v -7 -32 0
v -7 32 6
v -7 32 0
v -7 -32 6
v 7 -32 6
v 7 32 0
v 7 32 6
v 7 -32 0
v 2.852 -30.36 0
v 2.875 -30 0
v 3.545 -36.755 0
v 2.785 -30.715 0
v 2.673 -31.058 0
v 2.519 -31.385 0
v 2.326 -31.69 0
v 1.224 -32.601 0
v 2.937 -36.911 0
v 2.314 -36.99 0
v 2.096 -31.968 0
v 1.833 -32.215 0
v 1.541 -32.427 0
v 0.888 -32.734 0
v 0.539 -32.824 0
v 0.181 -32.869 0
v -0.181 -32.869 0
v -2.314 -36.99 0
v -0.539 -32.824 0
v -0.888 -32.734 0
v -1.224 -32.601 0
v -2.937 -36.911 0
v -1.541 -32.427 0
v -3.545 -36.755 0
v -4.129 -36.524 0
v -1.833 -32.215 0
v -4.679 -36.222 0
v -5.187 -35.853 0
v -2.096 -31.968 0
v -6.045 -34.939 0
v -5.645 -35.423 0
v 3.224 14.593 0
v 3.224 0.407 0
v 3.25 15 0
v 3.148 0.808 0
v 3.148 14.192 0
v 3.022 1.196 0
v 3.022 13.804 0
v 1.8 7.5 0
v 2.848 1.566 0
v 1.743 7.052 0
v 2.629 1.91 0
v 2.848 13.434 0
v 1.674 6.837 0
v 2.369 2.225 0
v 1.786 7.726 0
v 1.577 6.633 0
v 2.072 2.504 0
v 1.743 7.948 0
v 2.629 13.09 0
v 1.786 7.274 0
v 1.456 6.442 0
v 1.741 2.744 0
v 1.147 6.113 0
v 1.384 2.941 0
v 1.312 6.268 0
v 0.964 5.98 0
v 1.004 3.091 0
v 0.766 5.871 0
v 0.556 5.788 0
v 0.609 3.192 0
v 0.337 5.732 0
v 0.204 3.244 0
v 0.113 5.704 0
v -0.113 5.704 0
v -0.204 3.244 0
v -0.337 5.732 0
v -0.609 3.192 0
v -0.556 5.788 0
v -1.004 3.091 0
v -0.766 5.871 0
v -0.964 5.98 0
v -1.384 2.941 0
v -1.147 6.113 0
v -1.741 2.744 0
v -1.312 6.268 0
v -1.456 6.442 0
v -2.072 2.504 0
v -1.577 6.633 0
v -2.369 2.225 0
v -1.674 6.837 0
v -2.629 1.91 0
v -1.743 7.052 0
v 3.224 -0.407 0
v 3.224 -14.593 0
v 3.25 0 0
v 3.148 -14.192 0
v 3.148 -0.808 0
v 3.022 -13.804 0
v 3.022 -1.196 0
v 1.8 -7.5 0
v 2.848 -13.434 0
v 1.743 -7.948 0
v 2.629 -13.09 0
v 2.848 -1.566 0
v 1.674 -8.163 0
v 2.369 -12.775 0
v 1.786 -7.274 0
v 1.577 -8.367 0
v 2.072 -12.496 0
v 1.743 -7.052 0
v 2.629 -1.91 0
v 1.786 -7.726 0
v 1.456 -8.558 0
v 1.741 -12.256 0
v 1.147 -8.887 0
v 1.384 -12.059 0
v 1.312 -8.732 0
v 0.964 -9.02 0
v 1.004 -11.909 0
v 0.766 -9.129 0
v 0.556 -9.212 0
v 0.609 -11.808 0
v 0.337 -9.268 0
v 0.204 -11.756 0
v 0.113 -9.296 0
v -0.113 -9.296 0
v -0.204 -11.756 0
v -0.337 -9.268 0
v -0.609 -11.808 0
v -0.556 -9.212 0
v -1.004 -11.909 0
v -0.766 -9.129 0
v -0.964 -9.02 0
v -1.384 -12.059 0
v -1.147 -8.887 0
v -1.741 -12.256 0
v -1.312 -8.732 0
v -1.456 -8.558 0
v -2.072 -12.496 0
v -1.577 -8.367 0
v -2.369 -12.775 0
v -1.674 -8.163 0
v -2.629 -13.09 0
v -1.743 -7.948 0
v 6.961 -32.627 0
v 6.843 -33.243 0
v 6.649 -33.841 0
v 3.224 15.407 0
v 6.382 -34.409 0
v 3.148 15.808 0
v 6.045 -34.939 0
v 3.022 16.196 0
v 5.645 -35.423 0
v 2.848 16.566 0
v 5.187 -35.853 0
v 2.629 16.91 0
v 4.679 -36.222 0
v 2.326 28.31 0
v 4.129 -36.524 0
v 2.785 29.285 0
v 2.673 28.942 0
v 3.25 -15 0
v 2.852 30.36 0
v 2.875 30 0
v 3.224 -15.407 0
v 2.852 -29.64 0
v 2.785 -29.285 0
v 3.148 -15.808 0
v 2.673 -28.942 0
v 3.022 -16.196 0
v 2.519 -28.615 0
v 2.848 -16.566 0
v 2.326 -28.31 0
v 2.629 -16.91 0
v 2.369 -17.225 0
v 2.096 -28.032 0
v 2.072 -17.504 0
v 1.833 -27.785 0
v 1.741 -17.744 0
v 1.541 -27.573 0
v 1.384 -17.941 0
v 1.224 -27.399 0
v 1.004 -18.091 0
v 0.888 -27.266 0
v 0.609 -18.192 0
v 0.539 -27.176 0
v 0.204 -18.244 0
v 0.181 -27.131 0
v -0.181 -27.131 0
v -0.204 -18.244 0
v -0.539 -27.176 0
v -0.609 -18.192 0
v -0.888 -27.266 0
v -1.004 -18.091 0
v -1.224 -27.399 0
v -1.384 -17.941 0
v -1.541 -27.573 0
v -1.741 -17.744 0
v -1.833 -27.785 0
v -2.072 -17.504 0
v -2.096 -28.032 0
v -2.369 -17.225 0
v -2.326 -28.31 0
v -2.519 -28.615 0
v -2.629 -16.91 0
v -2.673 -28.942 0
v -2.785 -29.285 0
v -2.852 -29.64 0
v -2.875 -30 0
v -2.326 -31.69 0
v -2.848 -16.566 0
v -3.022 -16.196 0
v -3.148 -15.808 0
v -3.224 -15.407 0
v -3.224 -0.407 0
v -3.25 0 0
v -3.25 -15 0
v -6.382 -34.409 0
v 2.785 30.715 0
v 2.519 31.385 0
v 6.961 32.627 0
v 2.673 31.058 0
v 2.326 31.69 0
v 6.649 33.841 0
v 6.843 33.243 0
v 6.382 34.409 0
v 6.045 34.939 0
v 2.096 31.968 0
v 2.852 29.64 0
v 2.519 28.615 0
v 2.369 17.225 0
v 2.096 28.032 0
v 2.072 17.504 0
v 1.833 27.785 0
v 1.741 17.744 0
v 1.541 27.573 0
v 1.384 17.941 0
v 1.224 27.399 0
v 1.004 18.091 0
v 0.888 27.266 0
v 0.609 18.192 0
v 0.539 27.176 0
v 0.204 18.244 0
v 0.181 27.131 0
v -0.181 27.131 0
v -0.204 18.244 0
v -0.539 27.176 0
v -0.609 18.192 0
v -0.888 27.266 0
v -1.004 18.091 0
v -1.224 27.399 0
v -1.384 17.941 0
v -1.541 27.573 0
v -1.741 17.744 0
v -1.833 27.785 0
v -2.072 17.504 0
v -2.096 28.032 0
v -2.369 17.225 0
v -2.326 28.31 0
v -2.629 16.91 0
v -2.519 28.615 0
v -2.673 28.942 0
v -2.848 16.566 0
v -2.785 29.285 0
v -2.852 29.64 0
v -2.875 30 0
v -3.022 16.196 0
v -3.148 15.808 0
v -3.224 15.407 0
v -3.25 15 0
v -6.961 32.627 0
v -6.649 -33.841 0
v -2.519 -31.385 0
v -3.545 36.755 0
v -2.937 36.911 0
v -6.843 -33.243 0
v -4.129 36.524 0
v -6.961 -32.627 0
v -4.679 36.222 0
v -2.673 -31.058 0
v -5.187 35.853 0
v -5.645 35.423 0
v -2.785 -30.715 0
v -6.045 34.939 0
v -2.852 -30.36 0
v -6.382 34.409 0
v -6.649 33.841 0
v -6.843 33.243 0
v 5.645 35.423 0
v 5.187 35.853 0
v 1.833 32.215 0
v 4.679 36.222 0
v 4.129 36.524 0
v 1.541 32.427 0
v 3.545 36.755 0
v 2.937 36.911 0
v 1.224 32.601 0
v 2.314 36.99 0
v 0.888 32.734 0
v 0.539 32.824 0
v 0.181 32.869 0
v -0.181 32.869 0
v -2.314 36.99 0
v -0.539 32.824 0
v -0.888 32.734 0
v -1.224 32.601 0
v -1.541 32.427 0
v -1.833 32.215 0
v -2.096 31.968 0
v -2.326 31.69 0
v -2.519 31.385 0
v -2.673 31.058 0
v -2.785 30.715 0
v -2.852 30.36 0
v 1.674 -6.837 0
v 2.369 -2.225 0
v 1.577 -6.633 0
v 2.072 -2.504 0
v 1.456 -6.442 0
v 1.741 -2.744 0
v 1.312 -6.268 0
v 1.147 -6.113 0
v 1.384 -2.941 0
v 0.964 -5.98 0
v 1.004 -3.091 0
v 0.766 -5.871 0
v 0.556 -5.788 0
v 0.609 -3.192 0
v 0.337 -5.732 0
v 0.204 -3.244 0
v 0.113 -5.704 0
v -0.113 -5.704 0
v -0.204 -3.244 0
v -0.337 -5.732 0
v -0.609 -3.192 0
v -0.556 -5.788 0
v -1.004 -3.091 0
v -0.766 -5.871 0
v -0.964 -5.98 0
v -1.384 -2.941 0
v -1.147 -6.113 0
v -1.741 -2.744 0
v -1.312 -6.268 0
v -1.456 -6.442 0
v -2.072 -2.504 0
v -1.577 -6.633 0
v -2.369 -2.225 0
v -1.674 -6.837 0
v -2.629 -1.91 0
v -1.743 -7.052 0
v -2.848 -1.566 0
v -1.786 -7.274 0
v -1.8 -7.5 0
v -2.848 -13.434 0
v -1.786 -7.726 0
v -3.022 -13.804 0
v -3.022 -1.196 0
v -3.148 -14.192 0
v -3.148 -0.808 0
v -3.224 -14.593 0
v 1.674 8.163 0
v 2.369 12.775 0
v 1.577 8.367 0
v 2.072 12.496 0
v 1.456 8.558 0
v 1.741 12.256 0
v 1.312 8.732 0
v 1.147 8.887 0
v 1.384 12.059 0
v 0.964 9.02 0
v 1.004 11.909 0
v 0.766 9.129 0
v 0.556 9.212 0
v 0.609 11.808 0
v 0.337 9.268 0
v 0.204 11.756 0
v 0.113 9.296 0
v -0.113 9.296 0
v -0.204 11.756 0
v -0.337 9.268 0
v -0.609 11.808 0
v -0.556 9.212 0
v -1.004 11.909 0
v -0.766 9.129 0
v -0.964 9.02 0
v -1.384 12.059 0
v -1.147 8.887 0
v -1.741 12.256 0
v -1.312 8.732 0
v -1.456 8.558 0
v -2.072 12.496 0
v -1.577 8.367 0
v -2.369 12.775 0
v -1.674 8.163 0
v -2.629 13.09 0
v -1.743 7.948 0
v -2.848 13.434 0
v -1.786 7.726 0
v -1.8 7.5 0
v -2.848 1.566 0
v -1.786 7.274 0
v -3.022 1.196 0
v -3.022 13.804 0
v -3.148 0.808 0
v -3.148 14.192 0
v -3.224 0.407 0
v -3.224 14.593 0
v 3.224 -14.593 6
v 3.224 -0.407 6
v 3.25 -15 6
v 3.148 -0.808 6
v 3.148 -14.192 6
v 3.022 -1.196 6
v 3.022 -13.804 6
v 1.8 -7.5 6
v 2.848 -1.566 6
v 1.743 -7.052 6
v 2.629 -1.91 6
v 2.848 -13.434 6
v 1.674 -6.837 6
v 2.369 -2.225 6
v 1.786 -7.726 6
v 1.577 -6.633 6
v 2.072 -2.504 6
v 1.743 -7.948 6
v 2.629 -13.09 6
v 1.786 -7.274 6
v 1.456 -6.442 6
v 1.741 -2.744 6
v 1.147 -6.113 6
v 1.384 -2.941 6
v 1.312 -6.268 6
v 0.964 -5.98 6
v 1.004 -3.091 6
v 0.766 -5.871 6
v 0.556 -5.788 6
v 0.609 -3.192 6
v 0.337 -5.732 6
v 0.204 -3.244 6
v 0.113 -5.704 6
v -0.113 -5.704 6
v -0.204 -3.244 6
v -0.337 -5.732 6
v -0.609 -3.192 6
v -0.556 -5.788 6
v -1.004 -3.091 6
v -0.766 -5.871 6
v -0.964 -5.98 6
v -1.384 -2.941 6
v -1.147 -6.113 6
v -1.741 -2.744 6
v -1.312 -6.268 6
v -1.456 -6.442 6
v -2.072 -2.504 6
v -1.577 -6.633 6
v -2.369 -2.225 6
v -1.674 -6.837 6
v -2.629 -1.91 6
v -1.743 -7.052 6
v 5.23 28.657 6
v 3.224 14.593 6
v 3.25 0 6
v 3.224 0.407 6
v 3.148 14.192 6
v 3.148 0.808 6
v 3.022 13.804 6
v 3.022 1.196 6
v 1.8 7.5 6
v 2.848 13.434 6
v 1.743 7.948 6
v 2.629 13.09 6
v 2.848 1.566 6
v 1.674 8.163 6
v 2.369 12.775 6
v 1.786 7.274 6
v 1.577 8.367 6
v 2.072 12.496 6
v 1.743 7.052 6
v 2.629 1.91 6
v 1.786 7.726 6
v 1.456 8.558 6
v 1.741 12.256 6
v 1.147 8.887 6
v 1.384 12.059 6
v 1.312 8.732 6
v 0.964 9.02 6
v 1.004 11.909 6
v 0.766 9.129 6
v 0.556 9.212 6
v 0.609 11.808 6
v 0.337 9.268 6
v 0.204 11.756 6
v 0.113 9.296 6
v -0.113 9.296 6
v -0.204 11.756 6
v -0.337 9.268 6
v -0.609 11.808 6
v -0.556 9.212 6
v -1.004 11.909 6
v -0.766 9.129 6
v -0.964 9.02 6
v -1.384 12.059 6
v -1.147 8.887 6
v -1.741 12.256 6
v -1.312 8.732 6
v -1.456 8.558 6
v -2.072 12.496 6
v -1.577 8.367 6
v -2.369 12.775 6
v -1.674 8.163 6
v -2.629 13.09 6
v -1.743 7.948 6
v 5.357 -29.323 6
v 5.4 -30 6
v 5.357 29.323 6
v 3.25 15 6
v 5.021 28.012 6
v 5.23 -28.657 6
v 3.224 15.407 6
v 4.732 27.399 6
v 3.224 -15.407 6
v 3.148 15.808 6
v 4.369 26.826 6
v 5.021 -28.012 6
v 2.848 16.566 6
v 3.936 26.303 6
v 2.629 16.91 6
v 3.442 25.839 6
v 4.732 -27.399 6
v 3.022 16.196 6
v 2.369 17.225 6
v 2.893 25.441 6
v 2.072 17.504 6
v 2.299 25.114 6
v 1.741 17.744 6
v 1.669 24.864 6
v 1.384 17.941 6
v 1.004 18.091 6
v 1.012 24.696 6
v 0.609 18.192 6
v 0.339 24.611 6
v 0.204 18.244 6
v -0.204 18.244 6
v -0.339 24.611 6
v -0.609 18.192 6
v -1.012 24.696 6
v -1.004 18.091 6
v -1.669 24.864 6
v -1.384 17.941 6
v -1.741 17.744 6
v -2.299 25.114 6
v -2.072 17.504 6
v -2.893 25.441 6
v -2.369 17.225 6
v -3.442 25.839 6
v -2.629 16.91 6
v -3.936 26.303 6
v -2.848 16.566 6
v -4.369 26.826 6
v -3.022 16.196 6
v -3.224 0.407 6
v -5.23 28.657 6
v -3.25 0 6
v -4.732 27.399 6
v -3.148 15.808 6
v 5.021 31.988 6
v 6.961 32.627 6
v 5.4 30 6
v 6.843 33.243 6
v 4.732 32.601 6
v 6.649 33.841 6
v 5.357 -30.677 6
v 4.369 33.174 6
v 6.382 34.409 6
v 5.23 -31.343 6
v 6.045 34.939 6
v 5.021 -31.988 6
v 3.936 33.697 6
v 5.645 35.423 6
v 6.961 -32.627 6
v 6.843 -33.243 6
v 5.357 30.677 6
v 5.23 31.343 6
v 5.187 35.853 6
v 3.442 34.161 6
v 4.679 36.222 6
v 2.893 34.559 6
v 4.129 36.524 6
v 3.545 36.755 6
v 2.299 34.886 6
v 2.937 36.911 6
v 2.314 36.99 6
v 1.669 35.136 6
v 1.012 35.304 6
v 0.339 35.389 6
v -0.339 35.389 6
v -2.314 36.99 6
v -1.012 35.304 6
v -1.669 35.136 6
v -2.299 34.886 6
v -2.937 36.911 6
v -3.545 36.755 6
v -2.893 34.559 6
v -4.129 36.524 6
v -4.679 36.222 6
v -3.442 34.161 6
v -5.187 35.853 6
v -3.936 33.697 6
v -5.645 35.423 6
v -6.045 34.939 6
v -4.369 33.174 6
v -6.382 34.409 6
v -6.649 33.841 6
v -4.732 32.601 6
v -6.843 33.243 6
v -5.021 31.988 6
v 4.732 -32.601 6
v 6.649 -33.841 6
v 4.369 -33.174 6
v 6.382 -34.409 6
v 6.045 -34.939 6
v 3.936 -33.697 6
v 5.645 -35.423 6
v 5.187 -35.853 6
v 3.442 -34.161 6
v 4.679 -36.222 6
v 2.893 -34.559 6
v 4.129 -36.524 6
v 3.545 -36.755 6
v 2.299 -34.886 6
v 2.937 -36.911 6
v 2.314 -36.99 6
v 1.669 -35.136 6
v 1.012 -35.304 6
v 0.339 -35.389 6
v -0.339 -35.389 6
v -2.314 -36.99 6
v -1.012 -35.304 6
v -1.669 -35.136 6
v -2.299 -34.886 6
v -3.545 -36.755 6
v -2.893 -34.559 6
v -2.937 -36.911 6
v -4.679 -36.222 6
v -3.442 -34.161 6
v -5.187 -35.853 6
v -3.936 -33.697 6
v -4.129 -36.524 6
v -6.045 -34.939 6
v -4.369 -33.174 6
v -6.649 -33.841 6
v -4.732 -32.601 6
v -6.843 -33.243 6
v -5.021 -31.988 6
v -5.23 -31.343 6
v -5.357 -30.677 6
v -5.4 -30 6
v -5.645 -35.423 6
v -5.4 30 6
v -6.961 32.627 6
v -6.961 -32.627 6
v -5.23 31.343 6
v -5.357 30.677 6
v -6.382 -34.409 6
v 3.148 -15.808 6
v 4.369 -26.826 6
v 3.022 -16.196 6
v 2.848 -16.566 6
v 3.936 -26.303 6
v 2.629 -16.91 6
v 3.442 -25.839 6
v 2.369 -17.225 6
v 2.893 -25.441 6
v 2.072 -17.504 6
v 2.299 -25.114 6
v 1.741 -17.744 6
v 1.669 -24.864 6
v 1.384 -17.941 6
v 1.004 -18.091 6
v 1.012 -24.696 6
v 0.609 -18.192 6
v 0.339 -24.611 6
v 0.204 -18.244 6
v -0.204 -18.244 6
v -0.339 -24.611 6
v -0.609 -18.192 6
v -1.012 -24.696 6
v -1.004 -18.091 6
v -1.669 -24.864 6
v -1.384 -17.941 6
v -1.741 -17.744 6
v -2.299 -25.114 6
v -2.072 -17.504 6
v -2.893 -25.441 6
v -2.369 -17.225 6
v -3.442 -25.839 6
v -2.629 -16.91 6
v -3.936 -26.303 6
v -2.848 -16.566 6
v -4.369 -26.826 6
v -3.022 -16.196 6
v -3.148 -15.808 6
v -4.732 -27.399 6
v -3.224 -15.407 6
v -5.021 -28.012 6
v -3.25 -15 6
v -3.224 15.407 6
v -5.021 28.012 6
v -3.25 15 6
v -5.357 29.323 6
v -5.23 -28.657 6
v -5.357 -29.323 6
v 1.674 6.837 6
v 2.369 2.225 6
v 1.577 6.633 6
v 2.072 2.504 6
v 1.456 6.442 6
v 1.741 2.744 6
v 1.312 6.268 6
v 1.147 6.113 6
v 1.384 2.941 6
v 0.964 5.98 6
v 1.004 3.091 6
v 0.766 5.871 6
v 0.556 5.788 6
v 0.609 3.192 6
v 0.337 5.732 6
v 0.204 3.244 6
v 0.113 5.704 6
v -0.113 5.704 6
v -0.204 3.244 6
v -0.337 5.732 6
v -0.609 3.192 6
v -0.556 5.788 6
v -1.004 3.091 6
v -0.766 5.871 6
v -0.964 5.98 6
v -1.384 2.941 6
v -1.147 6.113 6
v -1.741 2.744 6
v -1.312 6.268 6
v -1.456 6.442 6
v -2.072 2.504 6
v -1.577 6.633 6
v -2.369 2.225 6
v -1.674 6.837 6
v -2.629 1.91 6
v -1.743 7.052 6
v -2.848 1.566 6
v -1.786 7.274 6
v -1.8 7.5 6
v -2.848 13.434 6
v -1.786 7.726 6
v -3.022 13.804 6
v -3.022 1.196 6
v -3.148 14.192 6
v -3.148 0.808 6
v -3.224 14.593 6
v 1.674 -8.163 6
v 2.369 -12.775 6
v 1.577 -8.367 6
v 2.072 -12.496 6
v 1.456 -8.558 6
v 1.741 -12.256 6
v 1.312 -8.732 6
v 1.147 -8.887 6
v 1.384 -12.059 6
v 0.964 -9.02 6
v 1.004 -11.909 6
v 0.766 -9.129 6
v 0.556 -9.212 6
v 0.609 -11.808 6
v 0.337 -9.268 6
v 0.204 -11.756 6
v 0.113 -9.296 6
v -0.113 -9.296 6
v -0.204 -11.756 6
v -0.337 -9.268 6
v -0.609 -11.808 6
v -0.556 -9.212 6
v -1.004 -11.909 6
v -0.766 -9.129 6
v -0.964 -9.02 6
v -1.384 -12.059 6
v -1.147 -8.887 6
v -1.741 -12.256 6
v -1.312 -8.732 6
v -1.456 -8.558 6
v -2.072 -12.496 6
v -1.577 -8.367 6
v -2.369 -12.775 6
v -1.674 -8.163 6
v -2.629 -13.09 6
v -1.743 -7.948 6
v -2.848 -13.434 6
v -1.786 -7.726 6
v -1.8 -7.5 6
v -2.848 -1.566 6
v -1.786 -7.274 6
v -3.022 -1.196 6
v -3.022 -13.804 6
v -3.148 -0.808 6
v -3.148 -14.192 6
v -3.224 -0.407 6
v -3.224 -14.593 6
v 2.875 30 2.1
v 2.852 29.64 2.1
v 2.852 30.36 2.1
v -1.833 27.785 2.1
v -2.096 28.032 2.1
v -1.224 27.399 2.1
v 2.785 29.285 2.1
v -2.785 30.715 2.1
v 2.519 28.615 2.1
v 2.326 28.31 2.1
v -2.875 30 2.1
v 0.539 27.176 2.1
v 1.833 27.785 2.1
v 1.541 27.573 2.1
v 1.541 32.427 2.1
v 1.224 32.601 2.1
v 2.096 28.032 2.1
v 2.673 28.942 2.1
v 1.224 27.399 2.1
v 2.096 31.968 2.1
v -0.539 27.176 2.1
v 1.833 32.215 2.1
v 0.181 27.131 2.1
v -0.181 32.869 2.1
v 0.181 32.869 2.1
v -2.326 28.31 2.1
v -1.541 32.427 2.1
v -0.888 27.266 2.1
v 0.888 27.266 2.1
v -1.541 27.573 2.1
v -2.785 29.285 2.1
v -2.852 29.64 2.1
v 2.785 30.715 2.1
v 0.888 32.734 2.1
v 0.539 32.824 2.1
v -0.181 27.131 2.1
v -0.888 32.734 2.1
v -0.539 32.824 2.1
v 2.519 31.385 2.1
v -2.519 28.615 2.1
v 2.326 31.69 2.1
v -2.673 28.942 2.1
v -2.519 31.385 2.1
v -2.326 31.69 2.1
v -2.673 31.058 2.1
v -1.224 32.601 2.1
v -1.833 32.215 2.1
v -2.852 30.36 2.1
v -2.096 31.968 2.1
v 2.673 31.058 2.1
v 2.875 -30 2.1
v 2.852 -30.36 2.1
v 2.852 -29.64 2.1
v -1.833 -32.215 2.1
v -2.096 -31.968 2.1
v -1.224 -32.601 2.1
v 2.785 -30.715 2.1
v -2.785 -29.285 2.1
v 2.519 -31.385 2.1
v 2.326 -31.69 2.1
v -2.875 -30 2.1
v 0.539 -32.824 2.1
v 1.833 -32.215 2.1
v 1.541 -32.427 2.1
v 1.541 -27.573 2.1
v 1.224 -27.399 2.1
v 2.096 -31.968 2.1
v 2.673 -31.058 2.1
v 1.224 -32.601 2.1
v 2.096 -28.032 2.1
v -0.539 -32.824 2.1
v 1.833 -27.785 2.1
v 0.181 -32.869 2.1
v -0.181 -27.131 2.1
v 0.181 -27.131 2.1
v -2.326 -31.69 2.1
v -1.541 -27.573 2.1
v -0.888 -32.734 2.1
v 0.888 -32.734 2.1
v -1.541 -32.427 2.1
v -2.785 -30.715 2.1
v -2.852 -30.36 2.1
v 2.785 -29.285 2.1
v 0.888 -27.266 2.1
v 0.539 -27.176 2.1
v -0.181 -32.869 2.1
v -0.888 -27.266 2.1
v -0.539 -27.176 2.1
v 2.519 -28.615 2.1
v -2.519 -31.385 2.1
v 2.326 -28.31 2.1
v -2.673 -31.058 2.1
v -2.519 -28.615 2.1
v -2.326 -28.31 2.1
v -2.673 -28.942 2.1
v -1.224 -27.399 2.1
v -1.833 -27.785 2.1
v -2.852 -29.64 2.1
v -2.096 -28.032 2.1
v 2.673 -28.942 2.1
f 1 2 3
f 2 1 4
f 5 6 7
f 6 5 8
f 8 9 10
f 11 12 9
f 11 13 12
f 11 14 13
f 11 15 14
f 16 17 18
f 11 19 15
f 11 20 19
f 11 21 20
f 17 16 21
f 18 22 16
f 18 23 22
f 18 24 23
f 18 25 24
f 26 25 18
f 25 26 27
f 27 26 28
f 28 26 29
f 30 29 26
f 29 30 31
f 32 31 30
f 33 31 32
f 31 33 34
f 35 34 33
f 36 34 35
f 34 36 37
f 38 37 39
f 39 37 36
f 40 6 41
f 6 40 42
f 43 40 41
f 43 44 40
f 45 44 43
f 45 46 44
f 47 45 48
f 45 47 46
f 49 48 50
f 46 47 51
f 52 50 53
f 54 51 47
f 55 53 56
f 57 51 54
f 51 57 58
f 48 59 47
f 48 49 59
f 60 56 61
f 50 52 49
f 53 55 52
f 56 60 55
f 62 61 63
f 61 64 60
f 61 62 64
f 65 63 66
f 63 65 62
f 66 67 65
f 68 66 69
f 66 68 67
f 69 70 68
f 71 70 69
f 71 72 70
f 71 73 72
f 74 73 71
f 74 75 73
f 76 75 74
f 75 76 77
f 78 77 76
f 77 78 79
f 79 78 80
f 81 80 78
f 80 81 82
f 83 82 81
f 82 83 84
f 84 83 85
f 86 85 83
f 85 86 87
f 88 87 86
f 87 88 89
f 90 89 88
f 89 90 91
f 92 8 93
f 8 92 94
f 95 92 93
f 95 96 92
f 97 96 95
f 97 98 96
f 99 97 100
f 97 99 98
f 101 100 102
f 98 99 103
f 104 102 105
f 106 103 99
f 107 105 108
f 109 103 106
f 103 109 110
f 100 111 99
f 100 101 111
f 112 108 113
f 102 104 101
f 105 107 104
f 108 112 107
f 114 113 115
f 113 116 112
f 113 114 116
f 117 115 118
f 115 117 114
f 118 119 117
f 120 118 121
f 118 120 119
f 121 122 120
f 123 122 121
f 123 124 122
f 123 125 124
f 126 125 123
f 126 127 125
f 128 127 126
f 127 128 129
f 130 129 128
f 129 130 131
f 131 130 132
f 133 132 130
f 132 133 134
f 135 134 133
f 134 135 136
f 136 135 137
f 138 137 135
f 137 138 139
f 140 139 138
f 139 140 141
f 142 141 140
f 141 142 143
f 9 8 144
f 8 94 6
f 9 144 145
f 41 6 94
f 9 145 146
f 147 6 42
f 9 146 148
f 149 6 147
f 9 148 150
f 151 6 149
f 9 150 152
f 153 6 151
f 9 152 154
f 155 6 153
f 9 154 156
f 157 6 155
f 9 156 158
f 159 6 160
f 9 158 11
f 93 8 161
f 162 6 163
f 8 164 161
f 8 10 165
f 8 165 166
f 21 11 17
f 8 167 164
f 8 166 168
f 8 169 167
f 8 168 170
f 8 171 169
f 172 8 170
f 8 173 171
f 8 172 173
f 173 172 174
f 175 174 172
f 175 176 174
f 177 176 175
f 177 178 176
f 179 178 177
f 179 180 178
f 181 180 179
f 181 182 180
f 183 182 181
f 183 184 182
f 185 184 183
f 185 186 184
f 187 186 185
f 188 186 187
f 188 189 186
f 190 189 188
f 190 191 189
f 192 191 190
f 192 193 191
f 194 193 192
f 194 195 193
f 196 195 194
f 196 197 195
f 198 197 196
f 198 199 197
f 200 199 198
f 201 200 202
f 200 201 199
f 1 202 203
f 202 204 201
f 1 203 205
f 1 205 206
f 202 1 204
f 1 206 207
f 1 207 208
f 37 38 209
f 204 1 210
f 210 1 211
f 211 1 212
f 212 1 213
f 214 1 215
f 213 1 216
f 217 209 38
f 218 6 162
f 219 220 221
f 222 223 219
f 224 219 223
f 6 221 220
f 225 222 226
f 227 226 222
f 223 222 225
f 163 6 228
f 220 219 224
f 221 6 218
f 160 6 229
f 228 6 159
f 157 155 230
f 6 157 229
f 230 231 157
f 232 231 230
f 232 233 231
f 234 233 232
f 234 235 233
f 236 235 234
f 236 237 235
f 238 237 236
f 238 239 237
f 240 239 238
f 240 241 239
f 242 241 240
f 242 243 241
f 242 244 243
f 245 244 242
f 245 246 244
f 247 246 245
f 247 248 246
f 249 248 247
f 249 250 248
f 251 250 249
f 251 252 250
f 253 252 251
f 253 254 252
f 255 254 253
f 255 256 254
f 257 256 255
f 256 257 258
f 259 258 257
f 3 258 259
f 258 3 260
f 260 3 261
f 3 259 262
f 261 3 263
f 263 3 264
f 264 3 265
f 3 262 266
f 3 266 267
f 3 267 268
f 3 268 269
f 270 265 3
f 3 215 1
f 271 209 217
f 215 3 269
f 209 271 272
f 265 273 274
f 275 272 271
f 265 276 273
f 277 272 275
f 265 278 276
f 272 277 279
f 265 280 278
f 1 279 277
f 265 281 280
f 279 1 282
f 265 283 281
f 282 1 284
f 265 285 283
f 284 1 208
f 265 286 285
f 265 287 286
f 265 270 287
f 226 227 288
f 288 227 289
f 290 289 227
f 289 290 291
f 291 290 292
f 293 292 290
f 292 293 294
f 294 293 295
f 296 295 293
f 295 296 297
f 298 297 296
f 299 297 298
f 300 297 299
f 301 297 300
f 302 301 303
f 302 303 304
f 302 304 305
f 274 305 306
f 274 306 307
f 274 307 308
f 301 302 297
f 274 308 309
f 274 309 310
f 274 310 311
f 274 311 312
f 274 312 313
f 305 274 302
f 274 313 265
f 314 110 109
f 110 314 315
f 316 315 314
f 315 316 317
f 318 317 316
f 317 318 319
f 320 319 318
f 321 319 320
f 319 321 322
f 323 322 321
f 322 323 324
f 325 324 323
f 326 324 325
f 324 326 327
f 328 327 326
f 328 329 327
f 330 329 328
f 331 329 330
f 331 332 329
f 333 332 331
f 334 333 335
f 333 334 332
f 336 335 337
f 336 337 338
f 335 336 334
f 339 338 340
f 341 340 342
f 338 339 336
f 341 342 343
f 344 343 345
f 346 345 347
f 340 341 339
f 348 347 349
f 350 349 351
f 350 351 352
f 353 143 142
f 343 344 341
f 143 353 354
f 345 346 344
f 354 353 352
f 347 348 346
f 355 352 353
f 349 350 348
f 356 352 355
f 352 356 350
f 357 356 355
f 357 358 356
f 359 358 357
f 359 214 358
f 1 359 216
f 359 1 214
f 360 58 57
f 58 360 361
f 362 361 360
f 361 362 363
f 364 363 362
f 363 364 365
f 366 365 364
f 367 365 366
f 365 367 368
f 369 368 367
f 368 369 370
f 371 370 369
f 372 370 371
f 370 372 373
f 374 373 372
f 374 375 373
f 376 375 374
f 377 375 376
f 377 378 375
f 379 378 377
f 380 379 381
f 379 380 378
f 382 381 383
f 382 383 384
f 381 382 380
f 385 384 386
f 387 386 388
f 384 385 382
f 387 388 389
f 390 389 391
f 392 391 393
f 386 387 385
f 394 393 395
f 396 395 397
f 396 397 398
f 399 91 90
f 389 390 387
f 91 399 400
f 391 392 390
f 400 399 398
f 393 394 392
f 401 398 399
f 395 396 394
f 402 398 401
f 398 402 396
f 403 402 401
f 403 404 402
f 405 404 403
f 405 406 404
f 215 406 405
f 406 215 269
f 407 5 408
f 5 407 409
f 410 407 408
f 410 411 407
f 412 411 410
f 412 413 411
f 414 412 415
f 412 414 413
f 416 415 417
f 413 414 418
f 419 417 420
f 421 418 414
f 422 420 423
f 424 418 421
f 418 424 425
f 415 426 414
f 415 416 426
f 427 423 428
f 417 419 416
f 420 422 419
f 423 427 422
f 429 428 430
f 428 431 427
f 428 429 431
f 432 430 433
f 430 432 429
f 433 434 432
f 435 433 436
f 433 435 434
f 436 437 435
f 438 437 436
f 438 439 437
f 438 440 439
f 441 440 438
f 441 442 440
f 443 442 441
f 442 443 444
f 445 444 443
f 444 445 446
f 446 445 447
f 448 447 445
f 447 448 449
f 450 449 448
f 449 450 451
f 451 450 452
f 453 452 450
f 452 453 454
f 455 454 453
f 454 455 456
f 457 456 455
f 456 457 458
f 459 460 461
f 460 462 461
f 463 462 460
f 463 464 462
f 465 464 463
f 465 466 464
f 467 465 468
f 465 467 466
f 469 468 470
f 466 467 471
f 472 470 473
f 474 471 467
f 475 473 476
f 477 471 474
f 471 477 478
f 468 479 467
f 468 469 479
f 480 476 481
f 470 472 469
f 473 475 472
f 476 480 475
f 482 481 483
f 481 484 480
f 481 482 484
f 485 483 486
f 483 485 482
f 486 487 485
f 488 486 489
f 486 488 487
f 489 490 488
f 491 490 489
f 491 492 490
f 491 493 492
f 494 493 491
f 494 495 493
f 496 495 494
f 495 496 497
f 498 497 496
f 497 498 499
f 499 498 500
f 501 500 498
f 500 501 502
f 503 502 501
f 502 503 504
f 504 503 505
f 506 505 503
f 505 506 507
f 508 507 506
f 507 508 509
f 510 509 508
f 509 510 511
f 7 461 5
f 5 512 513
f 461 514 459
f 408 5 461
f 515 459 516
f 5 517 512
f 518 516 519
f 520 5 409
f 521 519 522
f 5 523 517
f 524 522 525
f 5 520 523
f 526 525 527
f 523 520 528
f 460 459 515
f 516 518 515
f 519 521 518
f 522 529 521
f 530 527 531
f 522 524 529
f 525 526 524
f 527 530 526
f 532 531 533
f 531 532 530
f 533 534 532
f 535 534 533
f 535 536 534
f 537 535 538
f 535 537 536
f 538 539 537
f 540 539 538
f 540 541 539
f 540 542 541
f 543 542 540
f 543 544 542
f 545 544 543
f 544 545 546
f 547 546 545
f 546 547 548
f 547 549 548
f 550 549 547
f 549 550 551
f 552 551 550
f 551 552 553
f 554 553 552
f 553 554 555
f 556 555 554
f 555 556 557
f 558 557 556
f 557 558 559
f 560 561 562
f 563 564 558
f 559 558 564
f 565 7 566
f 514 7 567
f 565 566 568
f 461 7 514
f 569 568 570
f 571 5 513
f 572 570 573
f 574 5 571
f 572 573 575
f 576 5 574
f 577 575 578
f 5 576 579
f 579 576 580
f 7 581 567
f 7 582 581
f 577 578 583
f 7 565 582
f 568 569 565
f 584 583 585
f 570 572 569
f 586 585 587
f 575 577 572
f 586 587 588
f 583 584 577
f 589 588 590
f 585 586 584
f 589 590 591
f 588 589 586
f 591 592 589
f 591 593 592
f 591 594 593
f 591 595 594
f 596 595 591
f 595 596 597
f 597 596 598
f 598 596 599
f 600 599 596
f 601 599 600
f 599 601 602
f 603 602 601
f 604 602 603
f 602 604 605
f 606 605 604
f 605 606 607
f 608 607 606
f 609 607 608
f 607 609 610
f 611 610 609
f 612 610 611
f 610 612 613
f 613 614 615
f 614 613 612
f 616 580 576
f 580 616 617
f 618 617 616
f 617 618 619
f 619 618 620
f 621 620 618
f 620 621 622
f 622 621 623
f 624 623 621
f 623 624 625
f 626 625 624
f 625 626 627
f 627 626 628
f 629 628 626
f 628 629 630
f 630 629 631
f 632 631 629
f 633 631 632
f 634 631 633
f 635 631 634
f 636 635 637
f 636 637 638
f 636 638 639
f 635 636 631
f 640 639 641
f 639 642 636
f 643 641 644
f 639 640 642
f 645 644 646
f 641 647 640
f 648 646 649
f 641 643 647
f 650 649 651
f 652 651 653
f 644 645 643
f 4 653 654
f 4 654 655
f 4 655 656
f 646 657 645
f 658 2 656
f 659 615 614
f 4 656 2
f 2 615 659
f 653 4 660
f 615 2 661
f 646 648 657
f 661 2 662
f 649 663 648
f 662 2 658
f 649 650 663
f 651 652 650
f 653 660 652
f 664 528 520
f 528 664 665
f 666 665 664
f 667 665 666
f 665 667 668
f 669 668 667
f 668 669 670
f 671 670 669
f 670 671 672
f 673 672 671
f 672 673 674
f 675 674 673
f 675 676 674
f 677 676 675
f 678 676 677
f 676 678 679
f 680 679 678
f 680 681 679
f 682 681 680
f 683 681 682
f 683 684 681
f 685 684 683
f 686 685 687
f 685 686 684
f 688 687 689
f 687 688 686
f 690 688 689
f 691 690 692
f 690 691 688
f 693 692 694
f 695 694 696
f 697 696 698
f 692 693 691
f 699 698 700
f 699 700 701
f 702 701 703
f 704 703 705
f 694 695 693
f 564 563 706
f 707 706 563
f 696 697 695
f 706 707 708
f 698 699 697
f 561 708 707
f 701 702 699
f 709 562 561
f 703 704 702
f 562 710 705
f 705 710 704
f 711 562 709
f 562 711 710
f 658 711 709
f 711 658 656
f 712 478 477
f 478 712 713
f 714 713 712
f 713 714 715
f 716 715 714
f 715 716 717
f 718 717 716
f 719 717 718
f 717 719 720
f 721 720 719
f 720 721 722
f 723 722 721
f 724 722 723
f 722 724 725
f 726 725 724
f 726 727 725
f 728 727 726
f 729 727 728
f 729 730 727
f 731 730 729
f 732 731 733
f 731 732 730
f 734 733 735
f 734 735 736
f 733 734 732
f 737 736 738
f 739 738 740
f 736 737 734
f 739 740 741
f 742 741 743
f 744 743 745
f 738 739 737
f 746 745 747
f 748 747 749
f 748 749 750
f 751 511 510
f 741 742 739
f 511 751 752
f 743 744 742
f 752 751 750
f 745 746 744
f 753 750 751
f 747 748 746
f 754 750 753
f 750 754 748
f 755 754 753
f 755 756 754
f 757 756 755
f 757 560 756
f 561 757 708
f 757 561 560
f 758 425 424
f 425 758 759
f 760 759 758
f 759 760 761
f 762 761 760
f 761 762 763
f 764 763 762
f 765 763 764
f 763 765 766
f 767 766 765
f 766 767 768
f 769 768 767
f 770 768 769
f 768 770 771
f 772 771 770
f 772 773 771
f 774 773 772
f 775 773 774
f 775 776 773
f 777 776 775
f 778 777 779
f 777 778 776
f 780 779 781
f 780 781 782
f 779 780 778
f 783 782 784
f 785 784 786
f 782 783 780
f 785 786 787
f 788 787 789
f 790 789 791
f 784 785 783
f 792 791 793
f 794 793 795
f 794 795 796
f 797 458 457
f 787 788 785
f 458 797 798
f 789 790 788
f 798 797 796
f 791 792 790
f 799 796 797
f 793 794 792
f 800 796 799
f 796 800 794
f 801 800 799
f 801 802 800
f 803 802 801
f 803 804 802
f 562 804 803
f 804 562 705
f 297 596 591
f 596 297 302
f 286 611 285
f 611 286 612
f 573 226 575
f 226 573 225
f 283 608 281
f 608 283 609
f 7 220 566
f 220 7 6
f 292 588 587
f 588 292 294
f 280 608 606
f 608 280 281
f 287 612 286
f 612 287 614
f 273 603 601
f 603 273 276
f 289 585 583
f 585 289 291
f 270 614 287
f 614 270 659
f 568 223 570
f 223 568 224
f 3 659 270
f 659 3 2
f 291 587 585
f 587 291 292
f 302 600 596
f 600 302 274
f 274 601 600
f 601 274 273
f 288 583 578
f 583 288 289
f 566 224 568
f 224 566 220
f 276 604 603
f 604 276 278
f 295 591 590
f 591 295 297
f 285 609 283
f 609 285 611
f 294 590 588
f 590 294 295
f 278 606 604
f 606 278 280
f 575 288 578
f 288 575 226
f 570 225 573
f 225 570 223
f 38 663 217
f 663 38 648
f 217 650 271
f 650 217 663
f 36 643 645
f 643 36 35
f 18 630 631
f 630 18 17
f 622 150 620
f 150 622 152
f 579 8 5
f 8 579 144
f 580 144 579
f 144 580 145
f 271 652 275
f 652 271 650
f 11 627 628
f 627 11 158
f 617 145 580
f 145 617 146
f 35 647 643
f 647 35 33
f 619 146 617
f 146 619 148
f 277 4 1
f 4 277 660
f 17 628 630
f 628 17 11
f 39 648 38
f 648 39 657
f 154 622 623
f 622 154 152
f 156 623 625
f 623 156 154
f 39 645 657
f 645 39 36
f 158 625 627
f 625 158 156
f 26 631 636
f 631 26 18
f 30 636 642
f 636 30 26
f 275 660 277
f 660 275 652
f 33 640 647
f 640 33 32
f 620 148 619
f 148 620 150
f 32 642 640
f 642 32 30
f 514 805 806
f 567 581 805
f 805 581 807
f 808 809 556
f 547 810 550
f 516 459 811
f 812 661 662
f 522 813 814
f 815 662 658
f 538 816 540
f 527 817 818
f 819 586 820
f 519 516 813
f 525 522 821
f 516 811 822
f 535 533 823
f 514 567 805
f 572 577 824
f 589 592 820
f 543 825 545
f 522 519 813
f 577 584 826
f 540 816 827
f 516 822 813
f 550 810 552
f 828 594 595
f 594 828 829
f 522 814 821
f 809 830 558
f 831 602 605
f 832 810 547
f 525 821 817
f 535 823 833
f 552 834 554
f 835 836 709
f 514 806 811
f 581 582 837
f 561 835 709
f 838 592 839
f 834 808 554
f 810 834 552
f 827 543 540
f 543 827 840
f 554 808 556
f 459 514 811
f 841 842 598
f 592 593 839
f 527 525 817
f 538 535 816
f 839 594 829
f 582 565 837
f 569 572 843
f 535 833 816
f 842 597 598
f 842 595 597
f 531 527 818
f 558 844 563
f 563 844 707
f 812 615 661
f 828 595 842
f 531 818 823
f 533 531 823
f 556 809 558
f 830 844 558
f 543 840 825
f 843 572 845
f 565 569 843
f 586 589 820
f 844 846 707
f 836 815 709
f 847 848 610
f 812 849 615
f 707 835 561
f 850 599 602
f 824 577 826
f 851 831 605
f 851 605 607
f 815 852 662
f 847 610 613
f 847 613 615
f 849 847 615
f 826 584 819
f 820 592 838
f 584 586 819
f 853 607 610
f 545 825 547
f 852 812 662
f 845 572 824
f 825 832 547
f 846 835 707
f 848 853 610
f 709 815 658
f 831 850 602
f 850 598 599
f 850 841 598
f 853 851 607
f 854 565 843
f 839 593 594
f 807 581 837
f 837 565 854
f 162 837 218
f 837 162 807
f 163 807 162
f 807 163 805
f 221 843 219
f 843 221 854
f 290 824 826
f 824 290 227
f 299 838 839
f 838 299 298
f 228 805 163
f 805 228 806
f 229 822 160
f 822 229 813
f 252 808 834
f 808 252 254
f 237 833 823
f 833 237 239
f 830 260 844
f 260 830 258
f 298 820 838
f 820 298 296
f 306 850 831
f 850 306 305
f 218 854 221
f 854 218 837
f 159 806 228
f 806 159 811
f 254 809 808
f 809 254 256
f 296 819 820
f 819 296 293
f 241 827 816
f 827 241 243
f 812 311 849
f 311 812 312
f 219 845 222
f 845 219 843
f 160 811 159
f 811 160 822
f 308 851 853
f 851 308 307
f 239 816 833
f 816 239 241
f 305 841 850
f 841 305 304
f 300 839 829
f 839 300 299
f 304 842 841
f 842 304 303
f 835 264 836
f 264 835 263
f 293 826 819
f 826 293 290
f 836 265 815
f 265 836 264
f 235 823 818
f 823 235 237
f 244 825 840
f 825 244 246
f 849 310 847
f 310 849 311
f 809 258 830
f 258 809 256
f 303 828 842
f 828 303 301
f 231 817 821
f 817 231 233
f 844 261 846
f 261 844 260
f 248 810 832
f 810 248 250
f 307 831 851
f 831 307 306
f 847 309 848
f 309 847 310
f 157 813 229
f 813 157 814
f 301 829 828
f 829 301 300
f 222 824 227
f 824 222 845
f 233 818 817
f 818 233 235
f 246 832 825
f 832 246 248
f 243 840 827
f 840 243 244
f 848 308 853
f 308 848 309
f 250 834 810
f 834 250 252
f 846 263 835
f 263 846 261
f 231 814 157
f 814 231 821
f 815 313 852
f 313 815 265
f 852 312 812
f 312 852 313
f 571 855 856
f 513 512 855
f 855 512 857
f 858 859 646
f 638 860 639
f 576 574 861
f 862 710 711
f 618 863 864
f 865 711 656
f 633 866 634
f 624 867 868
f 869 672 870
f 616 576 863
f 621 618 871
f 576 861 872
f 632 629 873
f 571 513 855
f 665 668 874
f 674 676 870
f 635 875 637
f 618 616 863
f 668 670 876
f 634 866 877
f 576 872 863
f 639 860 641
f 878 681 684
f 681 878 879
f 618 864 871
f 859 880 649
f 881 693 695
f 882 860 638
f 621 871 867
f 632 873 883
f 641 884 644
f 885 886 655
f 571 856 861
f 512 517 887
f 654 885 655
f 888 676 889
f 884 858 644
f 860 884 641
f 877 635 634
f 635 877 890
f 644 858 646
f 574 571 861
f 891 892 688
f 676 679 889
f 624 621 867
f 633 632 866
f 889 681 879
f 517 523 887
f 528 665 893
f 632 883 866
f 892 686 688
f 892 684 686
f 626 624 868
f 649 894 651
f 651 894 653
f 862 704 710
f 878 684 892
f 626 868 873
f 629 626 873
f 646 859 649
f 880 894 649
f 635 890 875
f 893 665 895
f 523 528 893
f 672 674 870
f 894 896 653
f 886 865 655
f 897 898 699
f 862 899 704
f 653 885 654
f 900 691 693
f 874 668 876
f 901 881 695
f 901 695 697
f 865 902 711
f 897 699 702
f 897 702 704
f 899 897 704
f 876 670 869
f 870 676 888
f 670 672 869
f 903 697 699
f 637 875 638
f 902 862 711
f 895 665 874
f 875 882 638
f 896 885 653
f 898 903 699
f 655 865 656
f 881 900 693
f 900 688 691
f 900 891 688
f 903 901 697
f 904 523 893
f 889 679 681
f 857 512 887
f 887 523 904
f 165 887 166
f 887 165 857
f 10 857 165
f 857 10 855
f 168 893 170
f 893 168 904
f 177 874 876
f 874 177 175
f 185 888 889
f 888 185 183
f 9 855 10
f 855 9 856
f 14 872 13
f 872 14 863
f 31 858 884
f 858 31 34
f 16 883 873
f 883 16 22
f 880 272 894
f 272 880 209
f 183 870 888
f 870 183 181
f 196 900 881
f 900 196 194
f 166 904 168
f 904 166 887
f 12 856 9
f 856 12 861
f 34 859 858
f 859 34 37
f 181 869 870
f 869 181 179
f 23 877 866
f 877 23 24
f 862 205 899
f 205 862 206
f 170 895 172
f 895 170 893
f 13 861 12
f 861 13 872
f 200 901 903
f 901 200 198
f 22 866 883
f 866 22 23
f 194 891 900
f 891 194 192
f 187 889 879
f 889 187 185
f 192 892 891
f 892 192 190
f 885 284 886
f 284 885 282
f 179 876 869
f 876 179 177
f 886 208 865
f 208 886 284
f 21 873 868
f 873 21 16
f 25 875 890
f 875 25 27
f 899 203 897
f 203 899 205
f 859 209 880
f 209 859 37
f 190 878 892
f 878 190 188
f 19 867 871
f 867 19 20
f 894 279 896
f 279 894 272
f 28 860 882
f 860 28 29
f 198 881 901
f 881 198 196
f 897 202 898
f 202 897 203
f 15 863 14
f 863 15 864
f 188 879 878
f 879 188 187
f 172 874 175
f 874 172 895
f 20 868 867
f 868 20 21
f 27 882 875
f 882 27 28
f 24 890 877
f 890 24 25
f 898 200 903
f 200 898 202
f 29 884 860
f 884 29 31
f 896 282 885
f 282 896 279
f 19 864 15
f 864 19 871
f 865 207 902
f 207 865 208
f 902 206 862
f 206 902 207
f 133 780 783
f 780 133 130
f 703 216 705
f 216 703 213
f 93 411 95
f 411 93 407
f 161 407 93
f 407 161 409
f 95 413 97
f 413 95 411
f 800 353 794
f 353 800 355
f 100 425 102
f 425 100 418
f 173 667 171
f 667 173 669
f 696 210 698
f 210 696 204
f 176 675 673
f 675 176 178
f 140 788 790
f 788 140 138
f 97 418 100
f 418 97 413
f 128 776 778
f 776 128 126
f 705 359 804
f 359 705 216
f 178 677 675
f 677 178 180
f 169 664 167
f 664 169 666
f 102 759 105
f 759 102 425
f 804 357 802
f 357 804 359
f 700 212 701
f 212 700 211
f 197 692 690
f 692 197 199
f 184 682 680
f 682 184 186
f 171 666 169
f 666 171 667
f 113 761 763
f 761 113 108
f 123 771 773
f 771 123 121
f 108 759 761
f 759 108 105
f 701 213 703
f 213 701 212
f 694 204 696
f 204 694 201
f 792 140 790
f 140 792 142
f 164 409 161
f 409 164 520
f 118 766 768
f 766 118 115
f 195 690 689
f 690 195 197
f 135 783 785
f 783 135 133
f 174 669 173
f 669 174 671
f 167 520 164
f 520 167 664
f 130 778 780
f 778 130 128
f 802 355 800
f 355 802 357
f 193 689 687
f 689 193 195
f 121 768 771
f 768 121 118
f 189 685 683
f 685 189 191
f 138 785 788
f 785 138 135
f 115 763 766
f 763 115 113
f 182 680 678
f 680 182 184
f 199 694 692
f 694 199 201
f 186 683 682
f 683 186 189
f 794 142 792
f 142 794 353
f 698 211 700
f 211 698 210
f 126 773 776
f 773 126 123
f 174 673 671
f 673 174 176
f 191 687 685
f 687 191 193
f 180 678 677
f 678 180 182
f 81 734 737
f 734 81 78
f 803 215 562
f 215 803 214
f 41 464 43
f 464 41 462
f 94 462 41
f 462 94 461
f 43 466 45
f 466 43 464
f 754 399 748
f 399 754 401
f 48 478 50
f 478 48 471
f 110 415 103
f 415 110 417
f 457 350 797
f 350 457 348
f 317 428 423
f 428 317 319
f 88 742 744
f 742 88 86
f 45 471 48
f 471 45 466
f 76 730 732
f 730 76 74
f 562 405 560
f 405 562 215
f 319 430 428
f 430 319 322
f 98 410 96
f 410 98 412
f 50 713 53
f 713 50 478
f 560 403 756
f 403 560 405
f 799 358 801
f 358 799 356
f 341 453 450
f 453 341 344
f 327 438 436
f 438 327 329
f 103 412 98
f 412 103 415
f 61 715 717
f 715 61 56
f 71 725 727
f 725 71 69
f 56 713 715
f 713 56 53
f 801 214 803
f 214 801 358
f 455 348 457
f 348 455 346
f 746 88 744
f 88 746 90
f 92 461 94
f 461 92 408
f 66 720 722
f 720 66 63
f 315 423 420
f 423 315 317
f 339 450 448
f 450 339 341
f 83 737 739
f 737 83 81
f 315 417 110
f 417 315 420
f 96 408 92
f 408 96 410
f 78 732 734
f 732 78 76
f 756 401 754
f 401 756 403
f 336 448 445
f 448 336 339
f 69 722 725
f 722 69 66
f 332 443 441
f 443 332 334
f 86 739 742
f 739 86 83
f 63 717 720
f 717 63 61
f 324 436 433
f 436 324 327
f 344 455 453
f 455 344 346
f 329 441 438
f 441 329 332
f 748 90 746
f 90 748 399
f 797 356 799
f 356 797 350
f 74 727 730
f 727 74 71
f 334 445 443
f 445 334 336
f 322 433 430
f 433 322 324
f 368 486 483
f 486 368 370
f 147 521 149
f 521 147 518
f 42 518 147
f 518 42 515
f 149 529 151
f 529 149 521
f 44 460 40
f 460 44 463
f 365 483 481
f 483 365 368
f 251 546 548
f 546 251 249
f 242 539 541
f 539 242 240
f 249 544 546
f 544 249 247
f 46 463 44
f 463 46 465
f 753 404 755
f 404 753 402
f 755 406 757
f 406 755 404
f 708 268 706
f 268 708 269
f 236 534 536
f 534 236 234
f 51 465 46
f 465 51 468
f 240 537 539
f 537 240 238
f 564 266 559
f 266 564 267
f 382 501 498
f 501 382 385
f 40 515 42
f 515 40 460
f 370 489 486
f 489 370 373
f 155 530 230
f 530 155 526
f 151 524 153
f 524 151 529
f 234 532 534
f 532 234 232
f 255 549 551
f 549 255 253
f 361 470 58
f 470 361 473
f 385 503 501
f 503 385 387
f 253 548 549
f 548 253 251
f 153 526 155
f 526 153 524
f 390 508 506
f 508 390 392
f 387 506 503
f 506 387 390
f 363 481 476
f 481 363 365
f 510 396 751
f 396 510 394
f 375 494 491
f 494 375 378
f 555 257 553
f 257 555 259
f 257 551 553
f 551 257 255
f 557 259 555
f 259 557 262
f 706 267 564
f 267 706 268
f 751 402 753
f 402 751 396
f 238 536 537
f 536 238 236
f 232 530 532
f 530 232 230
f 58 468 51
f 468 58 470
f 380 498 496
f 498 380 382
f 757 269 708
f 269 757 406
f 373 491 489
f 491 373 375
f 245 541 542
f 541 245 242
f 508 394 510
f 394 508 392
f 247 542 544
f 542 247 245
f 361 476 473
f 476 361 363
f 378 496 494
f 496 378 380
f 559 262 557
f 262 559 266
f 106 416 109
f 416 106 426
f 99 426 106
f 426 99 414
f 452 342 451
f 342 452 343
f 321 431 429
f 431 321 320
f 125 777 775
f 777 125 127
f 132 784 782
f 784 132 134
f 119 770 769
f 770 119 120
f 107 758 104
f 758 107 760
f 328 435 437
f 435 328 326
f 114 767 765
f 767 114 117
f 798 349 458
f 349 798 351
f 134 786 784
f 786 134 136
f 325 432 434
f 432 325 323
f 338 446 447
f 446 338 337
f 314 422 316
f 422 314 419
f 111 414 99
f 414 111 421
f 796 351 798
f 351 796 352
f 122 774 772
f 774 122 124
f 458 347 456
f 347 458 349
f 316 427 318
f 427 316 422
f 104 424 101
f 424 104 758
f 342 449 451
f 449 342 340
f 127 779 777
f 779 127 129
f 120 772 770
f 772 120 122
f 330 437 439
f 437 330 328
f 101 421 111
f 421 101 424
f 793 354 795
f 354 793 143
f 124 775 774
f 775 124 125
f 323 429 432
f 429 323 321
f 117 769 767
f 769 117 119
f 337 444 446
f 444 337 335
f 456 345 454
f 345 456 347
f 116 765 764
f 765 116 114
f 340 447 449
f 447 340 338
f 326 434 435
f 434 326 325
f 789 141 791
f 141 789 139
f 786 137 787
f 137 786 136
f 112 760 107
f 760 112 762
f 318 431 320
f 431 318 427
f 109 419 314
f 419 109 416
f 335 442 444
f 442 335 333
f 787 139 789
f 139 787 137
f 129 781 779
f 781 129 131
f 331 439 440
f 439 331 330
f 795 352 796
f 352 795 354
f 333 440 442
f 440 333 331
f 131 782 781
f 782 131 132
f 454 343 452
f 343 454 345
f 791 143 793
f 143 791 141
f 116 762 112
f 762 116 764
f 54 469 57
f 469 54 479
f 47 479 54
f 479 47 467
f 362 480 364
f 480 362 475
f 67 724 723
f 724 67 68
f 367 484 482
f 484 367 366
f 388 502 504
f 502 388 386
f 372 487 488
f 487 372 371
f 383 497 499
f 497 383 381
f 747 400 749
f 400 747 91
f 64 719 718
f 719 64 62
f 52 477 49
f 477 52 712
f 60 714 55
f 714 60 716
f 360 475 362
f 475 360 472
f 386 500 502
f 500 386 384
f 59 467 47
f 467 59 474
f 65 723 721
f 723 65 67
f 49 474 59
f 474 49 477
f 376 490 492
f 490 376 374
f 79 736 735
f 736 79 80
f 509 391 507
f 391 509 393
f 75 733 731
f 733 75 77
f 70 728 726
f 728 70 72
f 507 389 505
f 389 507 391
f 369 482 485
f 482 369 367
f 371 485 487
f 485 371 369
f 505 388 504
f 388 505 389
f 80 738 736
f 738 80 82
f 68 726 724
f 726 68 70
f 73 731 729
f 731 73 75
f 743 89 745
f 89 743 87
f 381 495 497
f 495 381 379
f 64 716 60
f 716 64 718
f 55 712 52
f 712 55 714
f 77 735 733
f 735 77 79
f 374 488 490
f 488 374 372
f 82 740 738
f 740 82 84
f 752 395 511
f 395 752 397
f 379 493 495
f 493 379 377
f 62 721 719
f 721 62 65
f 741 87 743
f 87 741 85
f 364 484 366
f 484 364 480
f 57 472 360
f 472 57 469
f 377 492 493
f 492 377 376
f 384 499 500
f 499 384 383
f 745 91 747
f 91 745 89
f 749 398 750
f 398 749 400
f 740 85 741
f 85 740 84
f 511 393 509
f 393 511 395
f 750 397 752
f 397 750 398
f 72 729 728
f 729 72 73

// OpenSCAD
$fn = 50;


difference() {
	union() {
		hull() {
			translate(v = [-2.0000000000, 17.0000000000, 0]) {
				cylinder(h = 6, r = 5);
			}
			translate(v = [2.0000000000, 17.0000000000, 0]) {
				cylinder(h = 6, r = 5);
			}
			translate(v = [-2.0000000000, -17.0000000000, 0]) {
				cylinder(h = 6, r = 5);
			}
			translate(v = [2.0000000000, -17.0000000000, 0]) {
				cylinder(h = 6, r = 5);
			}
		}
		translate(v = [0.0000000000, 22.5000000000, 0]) {
			hull() {
				translate(v = [-2.0000000000, 9.5000000000, 0]) {
					cylinder(h = 6, r = 5);
				}
				translate(v = [2.0000000000, 9.5000000000, 0]) {
					cylinder(h = 6, r = 5);
				}
				translate(v = [-2.0000000000, -9.5000000000, 0]) {
					cylinder(h = 6, r = 5);
				}
				translate(v = [2.0000000000, -9.5000000000, 0]) {
					cylinder(h = 6, r = 5);
				}
			}
		}
		translate(v = [0.0000000000, 22.5000000000, 0]) {
			hull() {
				translate(v = [-2.0000000000, 9.5000000000, 0]) {
					cylinder(h = 6, r = 5);
				}
				translate(v = [2.0000000000, 9.5000000000, 0]) {
					cylinder(h = 6, r = 5);
				}
				translate(v = [-2.0000000000, -9.5000000000, 0]) {
					cylinder(h = 6, r = 5);
				}
				translate(v = [2.0000000000, -9.5000000000, 0]) {
					cylinder(h = 6, r = 5);
				}
			}
		}
		translate(v = [0.0000000000, -22.5000000000, 0]) {
			hull() {
				translate(v = [-2.0000000000, 9.5000000000, 0]) {
					cylinder(h = 6, r = 5);
				}
				translate(v = [2.0000000000, 9.5000000000, 0]) {
					cylinder(h = 6, r = 5);
				}
				translate(v = [-2.0000000000, -9.5000000000, 0]) {
					cylinder(h = 6, r = 5);
				}
				translate(v = [2.0000000000, -9.5000000000, 0]) {
					cylinder(h = 6, r = 5);
				}
			}
		}
		translate(v = [0.0000000000, -22.5000000000, 0]) {
			hull() {
				translate(v = [-2.0000000000, 9.5000000000, 0]) {
					cylinder(h = 6, r = 5);
				}
				translate(v = [2.0000000000, 9.5000000000, 0]) {
					cylinder(h = 6, r = 5);
				}
				translate(v = [-2.0000000000, -9.5000000000, 0]) {
					cylinder(h = 6, r = 5);
				}
				translate(v = [2.0000000000, -9.5000000000, 0]) {
					cylinder(h = 6, r = 5);
				}
			}
		}
	}
	union() {
		translate(v = [0.0000000000, 30.0000000000, 6]) {
			rotate(a = [0, 0, 0]) {
				difference() {
					union() {
						#translate(v = [0, 0, -6.0000000000]) {
							cylinder(h = 6, r = 2.6000000000);
						}
						#translate(v = [0, 0, -3.9000000000]) {
							cylinder(h = 3.9000000000, r1 = 2.8750000000, r2 = 5.4000000000);
						}
						#translate(v = [0, 0, -6.0000000000]) {
							cylinder(h = 6, r = 2.8750000000);
						}
						#translate(v = [0, 0, -6.0000000000]) {
							cylinder(h = 6, r = 2.6000000000);
						}
					}
					union();
				}
			}
		}
		translate(v = [0.0000000000, 30.0000000000, 6]) {
			rotate(a = [0, 0, 0]) {
				difference() {
					union() {
						#translate(v = [0, 0, -6.0000000000]) {
							cylinder(h = 6, r = 2.6000000000);
						}
						#translate(v = [0, 0, -3.9000000000]) {
							cylinder(h = 3.9000000000, r1 = 2.8750000000, r2 = 5.4000000000);
						}
						#translate(v = [0, 0, -6.0000000000]) {
							cylinder(h = 6, r = 2.8750000000);
						}
						#translate(v = [0, 0, -6.0000000000]) {
							cylinder(h = 6, r = 2.6000000000);
						}
					}
					union();
				}
			}
		}
		translate(v = [0.0000000000, -30.0000000000, 6]) {
			rotate(a = [0, 0, 0]) {
				difference() {
					union() {
						#translate(v = [0, 0, -6.0000000000]) {
							cylinder(h = 6, r = 2.6000000000);
						}
						#translate(v = [0, 0, -3.9000000000]) {
							cylinder(h = 3.9000000000, r1 = 2.8750000000, r2 = 5.4000000000);
						}
						#translate(v = [0, 0, -6.0000000000]) {
							cylinder(h = 6, r = 2.8750000000);
						}
						#translate(v = [0, 0, -6.0000000000]) {
							cylinder(h = 6, r = 2.6000000000);
						}
					}
					union();
				}
			}
		}
		translate(v = [0.0000000000, -30.0000000000, 6]) {
			rotate(a = [0, 0, 0]) {
				difference() {
					union() {
						#translate(v = [0, 0, -6.0000000000]) {
							cylinder(h = 6, r = 2.6000000000);
						}
						#translate(v = [0, 0, -3.9000000000]) {
							cylinder(h = 3.9000000000, r1 = 2.8750000000, r2 = 5.4000000000);
						}
						#translate(v = [0, 0, -6.0000000000]) {
							cylinder(h = 6, r = 2.8750000000);
						}
						#translate(v = [0, 0, -6.0000000000]) {
							cylinder(h = 6, r = 2.6000000000);
						}
					}
					union();
				}
			}
		}
		translate(v = [0.0000000000, -15.0000000000, 0]) {
			translate(v = [0, 0, -100]) {
				cylinder(h = 200, r = 3.2500000000);
			}
		}
		translate(v = [0, 0, -100]) {
			cylinder(h = 200, r = 3.2500000000);
		}
		translate(v = [0.0000000000, 15.0000000000, 0]) {
			translate(v = [0, 0, -100]) {
				cylinder(h = 200, r = 3.2500000000);
			}
		}
		translate(v = [0.0000000000, -15.0000000000, 0]) {
			translate(v = [0, 0, -100]) {
				cylinder(h = 200, r = 1.8000000000);
			}
		}
		translate(v = [0.0000000000, -7.5000000000, 0]) {
			translate(v = [0, 0, -100]) {
				cylinder(h = 200, r = 1.8000000000);
			}
		}
		translate(v = [0, 0, -100]) {
			cylinder(h = 200, r = 1.8000000000);
		}
		translate(v = [0.0000000000, 7.5000000000, 0]) {
			translate(v = [0, 0, -100]) {
				cylinder(h = 200, r = 1.8000000000);
			}
		}
		translate(v = [0.0000000000, 15.0000000000, 0]) {
			translate(v = [0, 0, -100]) {
				cylinder(h = 200, r = 1.8000000000);
			}
		}
	}
}
